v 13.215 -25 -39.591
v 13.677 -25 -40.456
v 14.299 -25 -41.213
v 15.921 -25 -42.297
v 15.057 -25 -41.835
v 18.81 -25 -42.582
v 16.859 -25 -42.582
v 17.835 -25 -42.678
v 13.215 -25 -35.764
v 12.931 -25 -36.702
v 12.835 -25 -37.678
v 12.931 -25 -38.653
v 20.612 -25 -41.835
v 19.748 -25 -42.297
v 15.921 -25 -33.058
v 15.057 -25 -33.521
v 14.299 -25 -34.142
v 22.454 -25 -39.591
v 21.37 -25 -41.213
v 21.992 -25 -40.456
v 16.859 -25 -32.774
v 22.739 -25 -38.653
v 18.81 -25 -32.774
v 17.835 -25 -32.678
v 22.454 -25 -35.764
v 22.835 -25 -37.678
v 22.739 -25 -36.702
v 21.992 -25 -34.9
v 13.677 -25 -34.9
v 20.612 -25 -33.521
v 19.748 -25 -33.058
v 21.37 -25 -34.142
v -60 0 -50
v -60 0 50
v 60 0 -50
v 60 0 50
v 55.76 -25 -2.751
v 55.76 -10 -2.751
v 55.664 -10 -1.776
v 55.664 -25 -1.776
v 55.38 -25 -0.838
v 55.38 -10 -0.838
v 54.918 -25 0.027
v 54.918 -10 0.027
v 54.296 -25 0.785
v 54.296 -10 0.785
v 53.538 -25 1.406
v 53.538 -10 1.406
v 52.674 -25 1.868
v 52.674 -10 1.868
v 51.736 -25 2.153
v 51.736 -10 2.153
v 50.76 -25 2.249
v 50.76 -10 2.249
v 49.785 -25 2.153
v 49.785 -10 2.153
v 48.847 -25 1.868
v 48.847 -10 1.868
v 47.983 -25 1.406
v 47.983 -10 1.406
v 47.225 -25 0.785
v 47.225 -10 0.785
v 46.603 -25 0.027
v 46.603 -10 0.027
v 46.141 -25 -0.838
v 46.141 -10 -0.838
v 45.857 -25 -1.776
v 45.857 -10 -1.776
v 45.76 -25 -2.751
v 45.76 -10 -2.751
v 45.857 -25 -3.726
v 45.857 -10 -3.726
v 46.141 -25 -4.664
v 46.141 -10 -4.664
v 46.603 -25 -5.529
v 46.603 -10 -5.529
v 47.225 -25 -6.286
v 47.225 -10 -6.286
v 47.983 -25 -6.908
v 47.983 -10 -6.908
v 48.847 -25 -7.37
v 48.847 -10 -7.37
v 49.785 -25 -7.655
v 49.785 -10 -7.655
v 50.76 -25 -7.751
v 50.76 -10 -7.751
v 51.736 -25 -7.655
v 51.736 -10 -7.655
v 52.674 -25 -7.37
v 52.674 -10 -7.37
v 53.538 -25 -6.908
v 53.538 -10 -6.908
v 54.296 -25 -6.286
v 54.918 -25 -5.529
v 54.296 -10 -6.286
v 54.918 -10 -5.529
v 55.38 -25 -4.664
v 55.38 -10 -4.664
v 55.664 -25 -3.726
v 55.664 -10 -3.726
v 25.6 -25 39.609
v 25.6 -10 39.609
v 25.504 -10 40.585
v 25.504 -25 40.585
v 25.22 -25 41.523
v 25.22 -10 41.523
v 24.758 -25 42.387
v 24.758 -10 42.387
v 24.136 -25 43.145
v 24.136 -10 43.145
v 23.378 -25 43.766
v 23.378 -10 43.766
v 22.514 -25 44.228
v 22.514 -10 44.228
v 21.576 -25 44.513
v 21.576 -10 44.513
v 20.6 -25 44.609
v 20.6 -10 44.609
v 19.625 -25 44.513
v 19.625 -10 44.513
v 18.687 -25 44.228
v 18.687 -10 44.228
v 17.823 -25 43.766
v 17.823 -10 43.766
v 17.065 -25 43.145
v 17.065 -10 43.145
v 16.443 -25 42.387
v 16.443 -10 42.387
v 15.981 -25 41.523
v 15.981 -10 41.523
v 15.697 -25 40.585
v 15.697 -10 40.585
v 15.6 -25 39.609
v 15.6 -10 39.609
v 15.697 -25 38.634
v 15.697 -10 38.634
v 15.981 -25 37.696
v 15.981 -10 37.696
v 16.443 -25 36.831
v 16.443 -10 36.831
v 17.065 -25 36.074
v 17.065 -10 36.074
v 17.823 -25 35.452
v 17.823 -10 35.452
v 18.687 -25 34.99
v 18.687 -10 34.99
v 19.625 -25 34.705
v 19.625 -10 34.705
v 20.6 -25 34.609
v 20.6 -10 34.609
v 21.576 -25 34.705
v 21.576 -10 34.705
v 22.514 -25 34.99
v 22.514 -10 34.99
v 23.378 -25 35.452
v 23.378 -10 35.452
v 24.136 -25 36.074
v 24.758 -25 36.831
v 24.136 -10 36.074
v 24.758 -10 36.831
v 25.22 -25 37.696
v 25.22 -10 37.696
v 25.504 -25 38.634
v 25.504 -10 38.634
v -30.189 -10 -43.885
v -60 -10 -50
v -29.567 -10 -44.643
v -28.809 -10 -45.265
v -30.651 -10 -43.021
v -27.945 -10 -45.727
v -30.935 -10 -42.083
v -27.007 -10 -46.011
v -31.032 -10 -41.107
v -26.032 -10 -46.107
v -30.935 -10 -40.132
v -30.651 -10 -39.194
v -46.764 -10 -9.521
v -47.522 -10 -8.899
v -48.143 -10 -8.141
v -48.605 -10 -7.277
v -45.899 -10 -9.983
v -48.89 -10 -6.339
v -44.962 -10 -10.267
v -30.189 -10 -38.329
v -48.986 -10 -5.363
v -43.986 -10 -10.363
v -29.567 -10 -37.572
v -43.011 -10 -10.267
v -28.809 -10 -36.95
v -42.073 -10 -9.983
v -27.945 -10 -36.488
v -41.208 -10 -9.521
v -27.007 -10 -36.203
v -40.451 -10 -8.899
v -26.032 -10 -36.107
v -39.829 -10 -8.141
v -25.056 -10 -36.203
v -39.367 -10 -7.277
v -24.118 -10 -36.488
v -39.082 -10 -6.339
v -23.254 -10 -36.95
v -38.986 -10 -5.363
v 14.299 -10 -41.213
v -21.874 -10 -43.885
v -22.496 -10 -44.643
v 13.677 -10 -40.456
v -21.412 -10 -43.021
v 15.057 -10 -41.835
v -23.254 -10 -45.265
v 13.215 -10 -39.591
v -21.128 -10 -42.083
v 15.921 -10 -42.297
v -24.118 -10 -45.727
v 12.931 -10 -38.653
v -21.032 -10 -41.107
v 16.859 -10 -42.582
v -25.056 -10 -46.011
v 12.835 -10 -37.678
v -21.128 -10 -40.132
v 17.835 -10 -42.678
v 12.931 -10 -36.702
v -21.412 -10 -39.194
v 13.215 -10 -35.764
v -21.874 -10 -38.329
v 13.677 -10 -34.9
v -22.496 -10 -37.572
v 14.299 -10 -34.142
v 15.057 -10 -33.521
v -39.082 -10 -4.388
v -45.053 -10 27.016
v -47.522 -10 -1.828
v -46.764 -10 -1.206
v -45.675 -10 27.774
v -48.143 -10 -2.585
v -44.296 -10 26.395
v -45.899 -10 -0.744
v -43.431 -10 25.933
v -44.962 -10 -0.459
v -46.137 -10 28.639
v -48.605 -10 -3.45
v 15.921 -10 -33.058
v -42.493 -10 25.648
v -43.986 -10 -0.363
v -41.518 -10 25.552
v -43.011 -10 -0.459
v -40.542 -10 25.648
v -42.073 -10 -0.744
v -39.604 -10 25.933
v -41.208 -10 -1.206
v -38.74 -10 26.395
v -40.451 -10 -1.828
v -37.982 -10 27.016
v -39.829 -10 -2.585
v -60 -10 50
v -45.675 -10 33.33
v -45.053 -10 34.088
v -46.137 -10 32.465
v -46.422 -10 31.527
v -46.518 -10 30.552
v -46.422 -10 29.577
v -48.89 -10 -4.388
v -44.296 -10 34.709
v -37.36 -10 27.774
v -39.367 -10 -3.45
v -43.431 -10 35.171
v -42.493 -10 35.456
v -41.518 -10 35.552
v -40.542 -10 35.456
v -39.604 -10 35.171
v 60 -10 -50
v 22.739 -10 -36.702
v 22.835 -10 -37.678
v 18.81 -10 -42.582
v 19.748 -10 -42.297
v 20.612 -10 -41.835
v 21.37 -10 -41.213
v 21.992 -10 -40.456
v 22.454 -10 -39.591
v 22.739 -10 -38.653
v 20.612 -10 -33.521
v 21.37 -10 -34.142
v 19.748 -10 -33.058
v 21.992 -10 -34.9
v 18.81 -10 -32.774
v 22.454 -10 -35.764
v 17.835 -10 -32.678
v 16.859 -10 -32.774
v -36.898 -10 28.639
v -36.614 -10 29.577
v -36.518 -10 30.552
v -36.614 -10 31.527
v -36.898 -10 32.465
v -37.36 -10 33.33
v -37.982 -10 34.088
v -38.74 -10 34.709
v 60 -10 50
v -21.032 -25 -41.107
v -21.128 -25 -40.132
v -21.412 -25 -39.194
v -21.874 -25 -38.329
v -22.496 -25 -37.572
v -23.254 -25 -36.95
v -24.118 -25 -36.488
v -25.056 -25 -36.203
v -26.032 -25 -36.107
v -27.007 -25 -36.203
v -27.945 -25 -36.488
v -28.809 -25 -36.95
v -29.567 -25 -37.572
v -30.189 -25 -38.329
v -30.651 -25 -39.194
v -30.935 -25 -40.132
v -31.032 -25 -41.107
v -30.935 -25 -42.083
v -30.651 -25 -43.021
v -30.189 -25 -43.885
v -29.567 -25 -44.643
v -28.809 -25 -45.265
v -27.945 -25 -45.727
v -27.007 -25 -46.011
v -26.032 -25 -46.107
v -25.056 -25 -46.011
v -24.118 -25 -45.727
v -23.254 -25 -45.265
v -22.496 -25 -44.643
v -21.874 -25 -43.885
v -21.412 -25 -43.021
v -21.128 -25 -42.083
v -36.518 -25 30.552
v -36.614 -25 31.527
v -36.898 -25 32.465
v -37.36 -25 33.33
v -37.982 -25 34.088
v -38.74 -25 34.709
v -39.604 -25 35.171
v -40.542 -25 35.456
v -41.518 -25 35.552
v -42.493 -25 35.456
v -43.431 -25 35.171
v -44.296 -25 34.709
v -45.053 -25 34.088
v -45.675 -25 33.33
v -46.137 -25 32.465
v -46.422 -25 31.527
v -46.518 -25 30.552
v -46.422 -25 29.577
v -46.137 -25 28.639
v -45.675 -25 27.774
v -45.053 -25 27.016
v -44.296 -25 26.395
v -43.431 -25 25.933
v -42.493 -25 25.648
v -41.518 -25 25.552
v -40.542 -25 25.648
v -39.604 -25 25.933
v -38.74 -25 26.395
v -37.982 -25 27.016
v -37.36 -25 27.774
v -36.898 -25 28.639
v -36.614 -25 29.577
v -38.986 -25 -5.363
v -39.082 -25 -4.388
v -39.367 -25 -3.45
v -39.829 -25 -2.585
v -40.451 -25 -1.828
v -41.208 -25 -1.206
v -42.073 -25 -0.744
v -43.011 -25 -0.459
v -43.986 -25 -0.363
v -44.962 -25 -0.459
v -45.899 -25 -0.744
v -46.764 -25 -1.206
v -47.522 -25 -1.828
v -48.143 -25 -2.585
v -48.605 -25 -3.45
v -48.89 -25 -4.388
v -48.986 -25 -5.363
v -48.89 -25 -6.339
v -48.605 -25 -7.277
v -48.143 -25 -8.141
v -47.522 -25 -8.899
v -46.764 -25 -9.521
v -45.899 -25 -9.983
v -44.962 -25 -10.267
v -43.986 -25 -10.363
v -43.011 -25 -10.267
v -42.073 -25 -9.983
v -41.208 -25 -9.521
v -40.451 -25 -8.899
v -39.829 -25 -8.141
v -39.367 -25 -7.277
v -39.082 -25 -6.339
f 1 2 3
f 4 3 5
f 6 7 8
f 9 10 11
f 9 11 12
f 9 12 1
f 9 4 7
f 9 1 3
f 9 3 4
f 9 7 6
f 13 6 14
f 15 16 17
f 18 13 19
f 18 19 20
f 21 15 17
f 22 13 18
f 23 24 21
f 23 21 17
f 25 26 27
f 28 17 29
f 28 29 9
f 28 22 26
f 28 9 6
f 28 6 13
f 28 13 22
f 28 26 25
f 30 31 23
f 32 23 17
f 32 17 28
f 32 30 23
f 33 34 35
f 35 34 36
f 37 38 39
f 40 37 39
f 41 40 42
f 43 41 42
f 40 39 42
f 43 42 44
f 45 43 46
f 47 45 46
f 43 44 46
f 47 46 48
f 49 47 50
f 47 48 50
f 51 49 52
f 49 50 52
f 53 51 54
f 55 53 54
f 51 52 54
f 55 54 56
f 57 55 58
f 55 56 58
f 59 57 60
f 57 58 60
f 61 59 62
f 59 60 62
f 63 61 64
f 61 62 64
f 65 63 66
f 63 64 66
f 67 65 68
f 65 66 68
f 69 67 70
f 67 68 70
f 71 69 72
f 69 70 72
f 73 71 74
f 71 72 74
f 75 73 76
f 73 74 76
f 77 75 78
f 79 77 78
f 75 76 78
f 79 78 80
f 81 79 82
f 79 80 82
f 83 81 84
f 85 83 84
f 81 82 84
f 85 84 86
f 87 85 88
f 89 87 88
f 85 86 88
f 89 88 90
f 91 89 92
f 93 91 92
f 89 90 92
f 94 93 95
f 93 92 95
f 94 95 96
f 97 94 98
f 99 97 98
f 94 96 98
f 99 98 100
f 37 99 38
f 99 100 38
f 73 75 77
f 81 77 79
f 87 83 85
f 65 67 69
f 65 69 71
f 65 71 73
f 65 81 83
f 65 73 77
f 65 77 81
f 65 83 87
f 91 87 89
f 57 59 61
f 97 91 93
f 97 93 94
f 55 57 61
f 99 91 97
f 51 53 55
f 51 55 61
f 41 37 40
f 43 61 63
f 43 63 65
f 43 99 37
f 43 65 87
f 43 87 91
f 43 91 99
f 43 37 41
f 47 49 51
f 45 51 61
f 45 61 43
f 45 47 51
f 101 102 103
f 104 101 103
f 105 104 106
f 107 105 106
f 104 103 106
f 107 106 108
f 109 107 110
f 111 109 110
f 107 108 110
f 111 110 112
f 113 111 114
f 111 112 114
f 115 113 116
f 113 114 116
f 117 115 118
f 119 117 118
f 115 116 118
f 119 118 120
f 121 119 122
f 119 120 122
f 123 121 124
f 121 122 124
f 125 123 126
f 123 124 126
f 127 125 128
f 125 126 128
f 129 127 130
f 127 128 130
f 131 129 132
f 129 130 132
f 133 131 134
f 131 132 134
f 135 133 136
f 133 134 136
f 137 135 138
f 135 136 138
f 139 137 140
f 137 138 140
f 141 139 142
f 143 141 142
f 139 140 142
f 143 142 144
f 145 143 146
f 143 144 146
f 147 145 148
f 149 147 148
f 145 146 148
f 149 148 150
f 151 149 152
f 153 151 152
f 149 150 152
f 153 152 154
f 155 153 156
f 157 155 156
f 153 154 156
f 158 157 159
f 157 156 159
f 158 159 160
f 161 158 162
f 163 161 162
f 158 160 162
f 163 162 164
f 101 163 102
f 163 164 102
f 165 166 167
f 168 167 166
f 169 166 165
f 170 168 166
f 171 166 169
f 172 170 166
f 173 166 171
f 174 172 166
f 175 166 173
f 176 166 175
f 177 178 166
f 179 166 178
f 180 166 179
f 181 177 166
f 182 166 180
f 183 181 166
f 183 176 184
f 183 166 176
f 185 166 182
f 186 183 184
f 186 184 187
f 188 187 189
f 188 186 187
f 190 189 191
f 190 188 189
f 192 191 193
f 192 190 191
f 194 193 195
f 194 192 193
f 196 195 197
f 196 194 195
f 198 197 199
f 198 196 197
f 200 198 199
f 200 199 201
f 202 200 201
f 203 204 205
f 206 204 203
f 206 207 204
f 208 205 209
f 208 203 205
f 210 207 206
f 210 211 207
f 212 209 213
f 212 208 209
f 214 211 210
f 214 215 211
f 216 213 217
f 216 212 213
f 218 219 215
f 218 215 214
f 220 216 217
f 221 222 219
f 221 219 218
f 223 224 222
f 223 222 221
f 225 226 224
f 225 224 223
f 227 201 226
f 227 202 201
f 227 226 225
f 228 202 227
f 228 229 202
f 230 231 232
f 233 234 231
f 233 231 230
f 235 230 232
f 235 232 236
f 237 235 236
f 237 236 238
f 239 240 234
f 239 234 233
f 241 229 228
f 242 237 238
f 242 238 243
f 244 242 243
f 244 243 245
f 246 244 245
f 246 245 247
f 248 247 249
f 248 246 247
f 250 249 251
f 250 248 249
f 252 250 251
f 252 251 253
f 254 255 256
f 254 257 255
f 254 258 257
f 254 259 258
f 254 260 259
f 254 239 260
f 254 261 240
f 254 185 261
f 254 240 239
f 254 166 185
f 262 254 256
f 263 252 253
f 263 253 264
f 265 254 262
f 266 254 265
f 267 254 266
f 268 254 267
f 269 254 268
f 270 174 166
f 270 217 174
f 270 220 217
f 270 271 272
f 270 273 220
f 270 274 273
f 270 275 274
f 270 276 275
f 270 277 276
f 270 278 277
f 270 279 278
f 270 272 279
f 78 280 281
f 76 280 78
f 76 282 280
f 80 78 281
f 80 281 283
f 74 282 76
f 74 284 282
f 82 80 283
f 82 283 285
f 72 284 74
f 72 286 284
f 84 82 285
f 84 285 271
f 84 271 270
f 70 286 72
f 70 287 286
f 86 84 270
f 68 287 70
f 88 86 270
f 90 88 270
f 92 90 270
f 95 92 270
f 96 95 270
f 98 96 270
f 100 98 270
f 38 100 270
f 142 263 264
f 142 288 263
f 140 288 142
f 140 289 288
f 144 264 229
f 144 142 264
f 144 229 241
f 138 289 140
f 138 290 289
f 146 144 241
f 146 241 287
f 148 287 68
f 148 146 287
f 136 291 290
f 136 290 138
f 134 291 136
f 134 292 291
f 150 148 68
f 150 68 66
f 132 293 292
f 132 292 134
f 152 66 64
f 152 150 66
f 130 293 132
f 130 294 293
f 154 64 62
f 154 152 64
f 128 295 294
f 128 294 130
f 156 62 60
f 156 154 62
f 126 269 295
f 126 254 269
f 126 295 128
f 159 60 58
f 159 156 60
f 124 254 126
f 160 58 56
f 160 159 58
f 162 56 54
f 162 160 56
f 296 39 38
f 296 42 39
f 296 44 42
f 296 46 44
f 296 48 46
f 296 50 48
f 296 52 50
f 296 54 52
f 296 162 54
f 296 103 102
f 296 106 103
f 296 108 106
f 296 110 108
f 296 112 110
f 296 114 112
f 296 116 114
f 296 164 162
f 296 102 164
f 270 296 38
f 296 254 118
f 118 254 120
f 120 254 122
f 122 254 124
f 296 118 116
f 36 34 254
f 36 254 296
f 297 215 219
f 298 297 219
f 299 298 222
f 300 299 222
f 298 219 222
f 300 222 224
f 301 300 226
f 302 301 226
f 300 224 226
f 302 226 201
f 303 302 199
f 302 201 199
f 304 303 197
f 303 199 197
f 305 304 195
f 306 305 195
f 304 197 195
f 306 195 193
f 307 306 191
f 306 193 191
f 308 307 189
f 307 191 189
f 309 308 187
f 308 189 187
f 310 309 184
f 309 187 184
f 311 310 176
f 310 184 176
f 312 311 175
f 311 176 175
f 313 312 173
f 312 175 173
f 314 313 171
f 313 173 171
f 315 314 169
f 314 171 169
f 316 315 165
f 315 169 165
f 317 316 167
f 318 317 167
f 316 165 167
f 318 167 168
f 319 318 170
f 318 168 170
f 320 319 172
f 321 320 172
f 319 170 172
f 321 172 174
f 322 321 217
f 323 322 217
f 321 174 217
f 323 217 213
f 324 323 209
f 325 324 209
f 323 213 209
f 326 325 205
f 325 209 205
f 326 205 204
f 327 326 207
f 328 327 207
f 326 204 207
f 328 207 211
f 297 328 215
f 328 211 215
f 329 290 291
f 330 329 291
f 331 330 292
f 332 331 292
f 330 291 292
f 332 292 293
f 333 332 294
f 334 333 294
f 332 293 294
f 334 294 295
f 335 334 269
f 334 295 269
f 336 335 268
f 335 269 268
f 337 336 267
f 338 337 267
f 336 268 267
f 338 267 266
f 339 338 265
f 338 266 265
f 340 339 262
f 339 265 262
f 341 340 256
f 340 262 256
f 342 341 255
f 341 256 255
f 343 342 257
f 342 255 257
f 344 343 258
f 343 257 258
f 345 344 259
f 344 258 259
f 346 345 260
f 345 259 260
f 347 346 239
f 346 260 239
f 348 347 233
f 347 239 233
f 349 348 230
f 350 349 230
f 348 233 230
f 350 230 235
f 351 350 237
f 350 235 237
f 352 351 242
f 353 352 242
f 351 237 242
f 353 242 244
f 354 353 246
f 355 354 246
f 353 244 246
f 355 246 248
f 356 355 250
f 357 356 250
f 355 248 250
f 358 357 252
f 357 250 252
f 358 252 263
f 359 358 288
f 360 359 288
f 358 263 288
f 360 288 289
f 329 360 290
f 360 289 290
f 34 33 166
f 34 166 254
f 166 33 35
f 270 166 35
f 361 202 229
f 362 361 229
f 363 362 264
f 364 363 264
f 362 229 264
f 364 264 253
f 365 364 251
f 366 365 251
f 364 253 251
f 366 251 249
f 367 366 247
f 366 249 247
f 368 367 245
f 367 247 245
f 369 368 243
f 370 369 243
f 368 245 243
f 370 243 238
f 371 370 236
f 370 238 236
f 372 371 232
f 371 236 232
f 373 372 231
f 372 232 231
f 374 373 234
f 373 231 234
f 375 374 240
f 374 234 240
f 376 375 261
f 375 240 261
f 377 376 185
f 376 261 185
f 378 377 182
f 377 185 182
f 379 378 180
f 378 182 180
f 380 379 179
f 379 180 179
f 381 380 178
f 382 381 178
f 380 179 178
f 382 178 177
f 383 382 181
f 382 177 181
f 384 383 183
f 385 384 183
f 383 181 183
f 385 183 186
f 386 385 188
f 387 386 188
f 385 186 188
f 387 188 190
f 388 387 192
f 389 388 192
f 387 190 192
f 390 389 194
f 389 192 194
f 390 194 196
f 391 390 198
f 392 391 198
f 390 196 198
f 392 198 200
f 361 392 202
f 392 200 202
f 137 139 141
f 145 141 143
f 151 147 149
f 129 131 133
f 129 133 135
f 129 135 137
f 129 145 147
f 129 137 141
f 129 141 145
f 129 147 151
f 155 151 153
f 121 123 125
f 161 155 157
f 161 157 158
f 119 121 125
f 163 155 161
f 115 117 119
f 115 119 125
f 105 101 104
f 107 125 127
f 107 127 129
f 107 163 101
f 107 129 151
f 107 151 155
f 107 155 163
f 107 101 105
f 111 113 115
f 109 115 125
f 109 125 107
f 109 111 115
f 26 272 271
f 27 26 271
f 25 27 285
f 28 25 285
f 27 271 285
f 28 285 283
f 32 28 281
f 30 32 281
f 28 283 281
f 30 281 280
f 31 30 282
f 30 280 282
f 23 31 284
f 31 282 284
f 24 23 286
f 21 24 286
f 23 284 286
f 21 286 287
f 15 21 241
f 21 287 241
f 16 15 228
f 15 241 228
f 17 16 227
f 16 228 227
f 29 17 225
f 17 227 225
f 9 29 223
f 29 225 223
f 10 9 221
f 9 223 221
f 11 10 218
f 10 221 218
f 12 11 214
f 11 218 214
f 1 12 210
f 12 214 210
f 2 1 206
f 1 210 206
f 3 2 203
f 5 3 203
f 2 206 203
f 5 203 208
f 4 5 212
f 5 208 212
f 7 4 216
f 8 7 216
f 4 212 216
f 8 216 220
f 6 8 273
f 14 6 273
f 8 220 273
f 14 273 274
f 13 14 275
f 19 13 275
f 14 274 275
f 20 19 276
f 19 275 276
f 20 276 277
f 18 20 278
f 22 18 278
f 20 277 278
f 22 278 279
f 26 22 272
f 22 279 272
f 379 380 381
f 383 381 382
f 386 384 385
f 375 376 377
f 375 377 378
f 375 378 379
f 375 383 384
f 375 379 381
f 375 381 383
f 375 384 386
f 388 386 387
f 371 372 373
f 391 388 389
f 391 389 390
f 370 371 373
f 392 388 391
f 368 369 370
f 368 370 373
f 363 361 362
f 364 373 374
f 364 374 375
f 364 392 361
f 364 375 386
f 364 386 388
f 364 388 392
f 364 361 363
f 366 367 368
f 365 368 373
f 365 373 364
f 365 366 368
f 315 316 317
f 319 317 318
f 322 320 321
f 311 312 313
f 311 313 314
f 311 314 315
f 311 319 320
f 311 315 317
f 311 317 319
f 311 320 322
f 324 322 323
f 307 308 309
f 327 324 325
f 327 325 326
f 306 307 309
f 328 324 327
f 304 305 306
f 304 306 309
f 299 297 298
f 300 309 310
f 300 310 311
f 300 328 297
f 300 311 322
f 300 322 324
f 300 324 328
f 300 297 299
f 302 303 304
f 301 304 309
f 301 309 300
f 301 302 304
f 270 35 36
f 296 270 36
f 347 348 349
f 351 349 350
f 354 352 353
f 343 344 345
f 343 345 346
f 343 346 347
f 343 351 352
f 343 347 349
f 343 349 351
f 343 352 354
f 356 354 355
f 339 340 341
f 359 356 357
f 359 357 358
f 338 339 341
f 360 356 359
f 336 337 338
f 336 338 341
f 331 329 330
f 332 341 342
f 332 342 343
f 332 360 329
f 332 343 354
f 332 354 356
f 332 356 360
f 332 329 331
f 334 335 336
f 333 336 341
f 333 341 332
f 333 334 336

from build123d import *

# Parameters (mm, degrees)
F0_W     = 120
F0_H     = 100
F1_DEPTH = 10
F2_R     = 5
F3_DEPTH = 15


with BuildPart() as f1:
    # F0 (on Front) → F1 (new body)
    with BuildSketch(Plane.XZ):
        Rectangle(F0_W, F0_H)
    extrude(amount=F1_DEPTH)

    # F2 (on face) → F3 (join)
    with BuildSketch(Plane.XZ.offset(10)):
        with Locations((-41.517758, 30.551978)):
            Circle(F2_R)
        with Locations((-43.986055, -5.363304)):
            Circle(F2_R)
        with Locations((-26.031511, -41.107316)):
            Circle(F2_R)
        with Locations((17.834636, -37.677866)):
            Circle(F2_R)
        with Locations((50.760479, -2.750959)):
            Circle(F2_R)
        with Locations((20.600477, 39.609097)):
            Circle(F2_R)
    extrude(amount=F3_DEPTH)


solid = f1.part
